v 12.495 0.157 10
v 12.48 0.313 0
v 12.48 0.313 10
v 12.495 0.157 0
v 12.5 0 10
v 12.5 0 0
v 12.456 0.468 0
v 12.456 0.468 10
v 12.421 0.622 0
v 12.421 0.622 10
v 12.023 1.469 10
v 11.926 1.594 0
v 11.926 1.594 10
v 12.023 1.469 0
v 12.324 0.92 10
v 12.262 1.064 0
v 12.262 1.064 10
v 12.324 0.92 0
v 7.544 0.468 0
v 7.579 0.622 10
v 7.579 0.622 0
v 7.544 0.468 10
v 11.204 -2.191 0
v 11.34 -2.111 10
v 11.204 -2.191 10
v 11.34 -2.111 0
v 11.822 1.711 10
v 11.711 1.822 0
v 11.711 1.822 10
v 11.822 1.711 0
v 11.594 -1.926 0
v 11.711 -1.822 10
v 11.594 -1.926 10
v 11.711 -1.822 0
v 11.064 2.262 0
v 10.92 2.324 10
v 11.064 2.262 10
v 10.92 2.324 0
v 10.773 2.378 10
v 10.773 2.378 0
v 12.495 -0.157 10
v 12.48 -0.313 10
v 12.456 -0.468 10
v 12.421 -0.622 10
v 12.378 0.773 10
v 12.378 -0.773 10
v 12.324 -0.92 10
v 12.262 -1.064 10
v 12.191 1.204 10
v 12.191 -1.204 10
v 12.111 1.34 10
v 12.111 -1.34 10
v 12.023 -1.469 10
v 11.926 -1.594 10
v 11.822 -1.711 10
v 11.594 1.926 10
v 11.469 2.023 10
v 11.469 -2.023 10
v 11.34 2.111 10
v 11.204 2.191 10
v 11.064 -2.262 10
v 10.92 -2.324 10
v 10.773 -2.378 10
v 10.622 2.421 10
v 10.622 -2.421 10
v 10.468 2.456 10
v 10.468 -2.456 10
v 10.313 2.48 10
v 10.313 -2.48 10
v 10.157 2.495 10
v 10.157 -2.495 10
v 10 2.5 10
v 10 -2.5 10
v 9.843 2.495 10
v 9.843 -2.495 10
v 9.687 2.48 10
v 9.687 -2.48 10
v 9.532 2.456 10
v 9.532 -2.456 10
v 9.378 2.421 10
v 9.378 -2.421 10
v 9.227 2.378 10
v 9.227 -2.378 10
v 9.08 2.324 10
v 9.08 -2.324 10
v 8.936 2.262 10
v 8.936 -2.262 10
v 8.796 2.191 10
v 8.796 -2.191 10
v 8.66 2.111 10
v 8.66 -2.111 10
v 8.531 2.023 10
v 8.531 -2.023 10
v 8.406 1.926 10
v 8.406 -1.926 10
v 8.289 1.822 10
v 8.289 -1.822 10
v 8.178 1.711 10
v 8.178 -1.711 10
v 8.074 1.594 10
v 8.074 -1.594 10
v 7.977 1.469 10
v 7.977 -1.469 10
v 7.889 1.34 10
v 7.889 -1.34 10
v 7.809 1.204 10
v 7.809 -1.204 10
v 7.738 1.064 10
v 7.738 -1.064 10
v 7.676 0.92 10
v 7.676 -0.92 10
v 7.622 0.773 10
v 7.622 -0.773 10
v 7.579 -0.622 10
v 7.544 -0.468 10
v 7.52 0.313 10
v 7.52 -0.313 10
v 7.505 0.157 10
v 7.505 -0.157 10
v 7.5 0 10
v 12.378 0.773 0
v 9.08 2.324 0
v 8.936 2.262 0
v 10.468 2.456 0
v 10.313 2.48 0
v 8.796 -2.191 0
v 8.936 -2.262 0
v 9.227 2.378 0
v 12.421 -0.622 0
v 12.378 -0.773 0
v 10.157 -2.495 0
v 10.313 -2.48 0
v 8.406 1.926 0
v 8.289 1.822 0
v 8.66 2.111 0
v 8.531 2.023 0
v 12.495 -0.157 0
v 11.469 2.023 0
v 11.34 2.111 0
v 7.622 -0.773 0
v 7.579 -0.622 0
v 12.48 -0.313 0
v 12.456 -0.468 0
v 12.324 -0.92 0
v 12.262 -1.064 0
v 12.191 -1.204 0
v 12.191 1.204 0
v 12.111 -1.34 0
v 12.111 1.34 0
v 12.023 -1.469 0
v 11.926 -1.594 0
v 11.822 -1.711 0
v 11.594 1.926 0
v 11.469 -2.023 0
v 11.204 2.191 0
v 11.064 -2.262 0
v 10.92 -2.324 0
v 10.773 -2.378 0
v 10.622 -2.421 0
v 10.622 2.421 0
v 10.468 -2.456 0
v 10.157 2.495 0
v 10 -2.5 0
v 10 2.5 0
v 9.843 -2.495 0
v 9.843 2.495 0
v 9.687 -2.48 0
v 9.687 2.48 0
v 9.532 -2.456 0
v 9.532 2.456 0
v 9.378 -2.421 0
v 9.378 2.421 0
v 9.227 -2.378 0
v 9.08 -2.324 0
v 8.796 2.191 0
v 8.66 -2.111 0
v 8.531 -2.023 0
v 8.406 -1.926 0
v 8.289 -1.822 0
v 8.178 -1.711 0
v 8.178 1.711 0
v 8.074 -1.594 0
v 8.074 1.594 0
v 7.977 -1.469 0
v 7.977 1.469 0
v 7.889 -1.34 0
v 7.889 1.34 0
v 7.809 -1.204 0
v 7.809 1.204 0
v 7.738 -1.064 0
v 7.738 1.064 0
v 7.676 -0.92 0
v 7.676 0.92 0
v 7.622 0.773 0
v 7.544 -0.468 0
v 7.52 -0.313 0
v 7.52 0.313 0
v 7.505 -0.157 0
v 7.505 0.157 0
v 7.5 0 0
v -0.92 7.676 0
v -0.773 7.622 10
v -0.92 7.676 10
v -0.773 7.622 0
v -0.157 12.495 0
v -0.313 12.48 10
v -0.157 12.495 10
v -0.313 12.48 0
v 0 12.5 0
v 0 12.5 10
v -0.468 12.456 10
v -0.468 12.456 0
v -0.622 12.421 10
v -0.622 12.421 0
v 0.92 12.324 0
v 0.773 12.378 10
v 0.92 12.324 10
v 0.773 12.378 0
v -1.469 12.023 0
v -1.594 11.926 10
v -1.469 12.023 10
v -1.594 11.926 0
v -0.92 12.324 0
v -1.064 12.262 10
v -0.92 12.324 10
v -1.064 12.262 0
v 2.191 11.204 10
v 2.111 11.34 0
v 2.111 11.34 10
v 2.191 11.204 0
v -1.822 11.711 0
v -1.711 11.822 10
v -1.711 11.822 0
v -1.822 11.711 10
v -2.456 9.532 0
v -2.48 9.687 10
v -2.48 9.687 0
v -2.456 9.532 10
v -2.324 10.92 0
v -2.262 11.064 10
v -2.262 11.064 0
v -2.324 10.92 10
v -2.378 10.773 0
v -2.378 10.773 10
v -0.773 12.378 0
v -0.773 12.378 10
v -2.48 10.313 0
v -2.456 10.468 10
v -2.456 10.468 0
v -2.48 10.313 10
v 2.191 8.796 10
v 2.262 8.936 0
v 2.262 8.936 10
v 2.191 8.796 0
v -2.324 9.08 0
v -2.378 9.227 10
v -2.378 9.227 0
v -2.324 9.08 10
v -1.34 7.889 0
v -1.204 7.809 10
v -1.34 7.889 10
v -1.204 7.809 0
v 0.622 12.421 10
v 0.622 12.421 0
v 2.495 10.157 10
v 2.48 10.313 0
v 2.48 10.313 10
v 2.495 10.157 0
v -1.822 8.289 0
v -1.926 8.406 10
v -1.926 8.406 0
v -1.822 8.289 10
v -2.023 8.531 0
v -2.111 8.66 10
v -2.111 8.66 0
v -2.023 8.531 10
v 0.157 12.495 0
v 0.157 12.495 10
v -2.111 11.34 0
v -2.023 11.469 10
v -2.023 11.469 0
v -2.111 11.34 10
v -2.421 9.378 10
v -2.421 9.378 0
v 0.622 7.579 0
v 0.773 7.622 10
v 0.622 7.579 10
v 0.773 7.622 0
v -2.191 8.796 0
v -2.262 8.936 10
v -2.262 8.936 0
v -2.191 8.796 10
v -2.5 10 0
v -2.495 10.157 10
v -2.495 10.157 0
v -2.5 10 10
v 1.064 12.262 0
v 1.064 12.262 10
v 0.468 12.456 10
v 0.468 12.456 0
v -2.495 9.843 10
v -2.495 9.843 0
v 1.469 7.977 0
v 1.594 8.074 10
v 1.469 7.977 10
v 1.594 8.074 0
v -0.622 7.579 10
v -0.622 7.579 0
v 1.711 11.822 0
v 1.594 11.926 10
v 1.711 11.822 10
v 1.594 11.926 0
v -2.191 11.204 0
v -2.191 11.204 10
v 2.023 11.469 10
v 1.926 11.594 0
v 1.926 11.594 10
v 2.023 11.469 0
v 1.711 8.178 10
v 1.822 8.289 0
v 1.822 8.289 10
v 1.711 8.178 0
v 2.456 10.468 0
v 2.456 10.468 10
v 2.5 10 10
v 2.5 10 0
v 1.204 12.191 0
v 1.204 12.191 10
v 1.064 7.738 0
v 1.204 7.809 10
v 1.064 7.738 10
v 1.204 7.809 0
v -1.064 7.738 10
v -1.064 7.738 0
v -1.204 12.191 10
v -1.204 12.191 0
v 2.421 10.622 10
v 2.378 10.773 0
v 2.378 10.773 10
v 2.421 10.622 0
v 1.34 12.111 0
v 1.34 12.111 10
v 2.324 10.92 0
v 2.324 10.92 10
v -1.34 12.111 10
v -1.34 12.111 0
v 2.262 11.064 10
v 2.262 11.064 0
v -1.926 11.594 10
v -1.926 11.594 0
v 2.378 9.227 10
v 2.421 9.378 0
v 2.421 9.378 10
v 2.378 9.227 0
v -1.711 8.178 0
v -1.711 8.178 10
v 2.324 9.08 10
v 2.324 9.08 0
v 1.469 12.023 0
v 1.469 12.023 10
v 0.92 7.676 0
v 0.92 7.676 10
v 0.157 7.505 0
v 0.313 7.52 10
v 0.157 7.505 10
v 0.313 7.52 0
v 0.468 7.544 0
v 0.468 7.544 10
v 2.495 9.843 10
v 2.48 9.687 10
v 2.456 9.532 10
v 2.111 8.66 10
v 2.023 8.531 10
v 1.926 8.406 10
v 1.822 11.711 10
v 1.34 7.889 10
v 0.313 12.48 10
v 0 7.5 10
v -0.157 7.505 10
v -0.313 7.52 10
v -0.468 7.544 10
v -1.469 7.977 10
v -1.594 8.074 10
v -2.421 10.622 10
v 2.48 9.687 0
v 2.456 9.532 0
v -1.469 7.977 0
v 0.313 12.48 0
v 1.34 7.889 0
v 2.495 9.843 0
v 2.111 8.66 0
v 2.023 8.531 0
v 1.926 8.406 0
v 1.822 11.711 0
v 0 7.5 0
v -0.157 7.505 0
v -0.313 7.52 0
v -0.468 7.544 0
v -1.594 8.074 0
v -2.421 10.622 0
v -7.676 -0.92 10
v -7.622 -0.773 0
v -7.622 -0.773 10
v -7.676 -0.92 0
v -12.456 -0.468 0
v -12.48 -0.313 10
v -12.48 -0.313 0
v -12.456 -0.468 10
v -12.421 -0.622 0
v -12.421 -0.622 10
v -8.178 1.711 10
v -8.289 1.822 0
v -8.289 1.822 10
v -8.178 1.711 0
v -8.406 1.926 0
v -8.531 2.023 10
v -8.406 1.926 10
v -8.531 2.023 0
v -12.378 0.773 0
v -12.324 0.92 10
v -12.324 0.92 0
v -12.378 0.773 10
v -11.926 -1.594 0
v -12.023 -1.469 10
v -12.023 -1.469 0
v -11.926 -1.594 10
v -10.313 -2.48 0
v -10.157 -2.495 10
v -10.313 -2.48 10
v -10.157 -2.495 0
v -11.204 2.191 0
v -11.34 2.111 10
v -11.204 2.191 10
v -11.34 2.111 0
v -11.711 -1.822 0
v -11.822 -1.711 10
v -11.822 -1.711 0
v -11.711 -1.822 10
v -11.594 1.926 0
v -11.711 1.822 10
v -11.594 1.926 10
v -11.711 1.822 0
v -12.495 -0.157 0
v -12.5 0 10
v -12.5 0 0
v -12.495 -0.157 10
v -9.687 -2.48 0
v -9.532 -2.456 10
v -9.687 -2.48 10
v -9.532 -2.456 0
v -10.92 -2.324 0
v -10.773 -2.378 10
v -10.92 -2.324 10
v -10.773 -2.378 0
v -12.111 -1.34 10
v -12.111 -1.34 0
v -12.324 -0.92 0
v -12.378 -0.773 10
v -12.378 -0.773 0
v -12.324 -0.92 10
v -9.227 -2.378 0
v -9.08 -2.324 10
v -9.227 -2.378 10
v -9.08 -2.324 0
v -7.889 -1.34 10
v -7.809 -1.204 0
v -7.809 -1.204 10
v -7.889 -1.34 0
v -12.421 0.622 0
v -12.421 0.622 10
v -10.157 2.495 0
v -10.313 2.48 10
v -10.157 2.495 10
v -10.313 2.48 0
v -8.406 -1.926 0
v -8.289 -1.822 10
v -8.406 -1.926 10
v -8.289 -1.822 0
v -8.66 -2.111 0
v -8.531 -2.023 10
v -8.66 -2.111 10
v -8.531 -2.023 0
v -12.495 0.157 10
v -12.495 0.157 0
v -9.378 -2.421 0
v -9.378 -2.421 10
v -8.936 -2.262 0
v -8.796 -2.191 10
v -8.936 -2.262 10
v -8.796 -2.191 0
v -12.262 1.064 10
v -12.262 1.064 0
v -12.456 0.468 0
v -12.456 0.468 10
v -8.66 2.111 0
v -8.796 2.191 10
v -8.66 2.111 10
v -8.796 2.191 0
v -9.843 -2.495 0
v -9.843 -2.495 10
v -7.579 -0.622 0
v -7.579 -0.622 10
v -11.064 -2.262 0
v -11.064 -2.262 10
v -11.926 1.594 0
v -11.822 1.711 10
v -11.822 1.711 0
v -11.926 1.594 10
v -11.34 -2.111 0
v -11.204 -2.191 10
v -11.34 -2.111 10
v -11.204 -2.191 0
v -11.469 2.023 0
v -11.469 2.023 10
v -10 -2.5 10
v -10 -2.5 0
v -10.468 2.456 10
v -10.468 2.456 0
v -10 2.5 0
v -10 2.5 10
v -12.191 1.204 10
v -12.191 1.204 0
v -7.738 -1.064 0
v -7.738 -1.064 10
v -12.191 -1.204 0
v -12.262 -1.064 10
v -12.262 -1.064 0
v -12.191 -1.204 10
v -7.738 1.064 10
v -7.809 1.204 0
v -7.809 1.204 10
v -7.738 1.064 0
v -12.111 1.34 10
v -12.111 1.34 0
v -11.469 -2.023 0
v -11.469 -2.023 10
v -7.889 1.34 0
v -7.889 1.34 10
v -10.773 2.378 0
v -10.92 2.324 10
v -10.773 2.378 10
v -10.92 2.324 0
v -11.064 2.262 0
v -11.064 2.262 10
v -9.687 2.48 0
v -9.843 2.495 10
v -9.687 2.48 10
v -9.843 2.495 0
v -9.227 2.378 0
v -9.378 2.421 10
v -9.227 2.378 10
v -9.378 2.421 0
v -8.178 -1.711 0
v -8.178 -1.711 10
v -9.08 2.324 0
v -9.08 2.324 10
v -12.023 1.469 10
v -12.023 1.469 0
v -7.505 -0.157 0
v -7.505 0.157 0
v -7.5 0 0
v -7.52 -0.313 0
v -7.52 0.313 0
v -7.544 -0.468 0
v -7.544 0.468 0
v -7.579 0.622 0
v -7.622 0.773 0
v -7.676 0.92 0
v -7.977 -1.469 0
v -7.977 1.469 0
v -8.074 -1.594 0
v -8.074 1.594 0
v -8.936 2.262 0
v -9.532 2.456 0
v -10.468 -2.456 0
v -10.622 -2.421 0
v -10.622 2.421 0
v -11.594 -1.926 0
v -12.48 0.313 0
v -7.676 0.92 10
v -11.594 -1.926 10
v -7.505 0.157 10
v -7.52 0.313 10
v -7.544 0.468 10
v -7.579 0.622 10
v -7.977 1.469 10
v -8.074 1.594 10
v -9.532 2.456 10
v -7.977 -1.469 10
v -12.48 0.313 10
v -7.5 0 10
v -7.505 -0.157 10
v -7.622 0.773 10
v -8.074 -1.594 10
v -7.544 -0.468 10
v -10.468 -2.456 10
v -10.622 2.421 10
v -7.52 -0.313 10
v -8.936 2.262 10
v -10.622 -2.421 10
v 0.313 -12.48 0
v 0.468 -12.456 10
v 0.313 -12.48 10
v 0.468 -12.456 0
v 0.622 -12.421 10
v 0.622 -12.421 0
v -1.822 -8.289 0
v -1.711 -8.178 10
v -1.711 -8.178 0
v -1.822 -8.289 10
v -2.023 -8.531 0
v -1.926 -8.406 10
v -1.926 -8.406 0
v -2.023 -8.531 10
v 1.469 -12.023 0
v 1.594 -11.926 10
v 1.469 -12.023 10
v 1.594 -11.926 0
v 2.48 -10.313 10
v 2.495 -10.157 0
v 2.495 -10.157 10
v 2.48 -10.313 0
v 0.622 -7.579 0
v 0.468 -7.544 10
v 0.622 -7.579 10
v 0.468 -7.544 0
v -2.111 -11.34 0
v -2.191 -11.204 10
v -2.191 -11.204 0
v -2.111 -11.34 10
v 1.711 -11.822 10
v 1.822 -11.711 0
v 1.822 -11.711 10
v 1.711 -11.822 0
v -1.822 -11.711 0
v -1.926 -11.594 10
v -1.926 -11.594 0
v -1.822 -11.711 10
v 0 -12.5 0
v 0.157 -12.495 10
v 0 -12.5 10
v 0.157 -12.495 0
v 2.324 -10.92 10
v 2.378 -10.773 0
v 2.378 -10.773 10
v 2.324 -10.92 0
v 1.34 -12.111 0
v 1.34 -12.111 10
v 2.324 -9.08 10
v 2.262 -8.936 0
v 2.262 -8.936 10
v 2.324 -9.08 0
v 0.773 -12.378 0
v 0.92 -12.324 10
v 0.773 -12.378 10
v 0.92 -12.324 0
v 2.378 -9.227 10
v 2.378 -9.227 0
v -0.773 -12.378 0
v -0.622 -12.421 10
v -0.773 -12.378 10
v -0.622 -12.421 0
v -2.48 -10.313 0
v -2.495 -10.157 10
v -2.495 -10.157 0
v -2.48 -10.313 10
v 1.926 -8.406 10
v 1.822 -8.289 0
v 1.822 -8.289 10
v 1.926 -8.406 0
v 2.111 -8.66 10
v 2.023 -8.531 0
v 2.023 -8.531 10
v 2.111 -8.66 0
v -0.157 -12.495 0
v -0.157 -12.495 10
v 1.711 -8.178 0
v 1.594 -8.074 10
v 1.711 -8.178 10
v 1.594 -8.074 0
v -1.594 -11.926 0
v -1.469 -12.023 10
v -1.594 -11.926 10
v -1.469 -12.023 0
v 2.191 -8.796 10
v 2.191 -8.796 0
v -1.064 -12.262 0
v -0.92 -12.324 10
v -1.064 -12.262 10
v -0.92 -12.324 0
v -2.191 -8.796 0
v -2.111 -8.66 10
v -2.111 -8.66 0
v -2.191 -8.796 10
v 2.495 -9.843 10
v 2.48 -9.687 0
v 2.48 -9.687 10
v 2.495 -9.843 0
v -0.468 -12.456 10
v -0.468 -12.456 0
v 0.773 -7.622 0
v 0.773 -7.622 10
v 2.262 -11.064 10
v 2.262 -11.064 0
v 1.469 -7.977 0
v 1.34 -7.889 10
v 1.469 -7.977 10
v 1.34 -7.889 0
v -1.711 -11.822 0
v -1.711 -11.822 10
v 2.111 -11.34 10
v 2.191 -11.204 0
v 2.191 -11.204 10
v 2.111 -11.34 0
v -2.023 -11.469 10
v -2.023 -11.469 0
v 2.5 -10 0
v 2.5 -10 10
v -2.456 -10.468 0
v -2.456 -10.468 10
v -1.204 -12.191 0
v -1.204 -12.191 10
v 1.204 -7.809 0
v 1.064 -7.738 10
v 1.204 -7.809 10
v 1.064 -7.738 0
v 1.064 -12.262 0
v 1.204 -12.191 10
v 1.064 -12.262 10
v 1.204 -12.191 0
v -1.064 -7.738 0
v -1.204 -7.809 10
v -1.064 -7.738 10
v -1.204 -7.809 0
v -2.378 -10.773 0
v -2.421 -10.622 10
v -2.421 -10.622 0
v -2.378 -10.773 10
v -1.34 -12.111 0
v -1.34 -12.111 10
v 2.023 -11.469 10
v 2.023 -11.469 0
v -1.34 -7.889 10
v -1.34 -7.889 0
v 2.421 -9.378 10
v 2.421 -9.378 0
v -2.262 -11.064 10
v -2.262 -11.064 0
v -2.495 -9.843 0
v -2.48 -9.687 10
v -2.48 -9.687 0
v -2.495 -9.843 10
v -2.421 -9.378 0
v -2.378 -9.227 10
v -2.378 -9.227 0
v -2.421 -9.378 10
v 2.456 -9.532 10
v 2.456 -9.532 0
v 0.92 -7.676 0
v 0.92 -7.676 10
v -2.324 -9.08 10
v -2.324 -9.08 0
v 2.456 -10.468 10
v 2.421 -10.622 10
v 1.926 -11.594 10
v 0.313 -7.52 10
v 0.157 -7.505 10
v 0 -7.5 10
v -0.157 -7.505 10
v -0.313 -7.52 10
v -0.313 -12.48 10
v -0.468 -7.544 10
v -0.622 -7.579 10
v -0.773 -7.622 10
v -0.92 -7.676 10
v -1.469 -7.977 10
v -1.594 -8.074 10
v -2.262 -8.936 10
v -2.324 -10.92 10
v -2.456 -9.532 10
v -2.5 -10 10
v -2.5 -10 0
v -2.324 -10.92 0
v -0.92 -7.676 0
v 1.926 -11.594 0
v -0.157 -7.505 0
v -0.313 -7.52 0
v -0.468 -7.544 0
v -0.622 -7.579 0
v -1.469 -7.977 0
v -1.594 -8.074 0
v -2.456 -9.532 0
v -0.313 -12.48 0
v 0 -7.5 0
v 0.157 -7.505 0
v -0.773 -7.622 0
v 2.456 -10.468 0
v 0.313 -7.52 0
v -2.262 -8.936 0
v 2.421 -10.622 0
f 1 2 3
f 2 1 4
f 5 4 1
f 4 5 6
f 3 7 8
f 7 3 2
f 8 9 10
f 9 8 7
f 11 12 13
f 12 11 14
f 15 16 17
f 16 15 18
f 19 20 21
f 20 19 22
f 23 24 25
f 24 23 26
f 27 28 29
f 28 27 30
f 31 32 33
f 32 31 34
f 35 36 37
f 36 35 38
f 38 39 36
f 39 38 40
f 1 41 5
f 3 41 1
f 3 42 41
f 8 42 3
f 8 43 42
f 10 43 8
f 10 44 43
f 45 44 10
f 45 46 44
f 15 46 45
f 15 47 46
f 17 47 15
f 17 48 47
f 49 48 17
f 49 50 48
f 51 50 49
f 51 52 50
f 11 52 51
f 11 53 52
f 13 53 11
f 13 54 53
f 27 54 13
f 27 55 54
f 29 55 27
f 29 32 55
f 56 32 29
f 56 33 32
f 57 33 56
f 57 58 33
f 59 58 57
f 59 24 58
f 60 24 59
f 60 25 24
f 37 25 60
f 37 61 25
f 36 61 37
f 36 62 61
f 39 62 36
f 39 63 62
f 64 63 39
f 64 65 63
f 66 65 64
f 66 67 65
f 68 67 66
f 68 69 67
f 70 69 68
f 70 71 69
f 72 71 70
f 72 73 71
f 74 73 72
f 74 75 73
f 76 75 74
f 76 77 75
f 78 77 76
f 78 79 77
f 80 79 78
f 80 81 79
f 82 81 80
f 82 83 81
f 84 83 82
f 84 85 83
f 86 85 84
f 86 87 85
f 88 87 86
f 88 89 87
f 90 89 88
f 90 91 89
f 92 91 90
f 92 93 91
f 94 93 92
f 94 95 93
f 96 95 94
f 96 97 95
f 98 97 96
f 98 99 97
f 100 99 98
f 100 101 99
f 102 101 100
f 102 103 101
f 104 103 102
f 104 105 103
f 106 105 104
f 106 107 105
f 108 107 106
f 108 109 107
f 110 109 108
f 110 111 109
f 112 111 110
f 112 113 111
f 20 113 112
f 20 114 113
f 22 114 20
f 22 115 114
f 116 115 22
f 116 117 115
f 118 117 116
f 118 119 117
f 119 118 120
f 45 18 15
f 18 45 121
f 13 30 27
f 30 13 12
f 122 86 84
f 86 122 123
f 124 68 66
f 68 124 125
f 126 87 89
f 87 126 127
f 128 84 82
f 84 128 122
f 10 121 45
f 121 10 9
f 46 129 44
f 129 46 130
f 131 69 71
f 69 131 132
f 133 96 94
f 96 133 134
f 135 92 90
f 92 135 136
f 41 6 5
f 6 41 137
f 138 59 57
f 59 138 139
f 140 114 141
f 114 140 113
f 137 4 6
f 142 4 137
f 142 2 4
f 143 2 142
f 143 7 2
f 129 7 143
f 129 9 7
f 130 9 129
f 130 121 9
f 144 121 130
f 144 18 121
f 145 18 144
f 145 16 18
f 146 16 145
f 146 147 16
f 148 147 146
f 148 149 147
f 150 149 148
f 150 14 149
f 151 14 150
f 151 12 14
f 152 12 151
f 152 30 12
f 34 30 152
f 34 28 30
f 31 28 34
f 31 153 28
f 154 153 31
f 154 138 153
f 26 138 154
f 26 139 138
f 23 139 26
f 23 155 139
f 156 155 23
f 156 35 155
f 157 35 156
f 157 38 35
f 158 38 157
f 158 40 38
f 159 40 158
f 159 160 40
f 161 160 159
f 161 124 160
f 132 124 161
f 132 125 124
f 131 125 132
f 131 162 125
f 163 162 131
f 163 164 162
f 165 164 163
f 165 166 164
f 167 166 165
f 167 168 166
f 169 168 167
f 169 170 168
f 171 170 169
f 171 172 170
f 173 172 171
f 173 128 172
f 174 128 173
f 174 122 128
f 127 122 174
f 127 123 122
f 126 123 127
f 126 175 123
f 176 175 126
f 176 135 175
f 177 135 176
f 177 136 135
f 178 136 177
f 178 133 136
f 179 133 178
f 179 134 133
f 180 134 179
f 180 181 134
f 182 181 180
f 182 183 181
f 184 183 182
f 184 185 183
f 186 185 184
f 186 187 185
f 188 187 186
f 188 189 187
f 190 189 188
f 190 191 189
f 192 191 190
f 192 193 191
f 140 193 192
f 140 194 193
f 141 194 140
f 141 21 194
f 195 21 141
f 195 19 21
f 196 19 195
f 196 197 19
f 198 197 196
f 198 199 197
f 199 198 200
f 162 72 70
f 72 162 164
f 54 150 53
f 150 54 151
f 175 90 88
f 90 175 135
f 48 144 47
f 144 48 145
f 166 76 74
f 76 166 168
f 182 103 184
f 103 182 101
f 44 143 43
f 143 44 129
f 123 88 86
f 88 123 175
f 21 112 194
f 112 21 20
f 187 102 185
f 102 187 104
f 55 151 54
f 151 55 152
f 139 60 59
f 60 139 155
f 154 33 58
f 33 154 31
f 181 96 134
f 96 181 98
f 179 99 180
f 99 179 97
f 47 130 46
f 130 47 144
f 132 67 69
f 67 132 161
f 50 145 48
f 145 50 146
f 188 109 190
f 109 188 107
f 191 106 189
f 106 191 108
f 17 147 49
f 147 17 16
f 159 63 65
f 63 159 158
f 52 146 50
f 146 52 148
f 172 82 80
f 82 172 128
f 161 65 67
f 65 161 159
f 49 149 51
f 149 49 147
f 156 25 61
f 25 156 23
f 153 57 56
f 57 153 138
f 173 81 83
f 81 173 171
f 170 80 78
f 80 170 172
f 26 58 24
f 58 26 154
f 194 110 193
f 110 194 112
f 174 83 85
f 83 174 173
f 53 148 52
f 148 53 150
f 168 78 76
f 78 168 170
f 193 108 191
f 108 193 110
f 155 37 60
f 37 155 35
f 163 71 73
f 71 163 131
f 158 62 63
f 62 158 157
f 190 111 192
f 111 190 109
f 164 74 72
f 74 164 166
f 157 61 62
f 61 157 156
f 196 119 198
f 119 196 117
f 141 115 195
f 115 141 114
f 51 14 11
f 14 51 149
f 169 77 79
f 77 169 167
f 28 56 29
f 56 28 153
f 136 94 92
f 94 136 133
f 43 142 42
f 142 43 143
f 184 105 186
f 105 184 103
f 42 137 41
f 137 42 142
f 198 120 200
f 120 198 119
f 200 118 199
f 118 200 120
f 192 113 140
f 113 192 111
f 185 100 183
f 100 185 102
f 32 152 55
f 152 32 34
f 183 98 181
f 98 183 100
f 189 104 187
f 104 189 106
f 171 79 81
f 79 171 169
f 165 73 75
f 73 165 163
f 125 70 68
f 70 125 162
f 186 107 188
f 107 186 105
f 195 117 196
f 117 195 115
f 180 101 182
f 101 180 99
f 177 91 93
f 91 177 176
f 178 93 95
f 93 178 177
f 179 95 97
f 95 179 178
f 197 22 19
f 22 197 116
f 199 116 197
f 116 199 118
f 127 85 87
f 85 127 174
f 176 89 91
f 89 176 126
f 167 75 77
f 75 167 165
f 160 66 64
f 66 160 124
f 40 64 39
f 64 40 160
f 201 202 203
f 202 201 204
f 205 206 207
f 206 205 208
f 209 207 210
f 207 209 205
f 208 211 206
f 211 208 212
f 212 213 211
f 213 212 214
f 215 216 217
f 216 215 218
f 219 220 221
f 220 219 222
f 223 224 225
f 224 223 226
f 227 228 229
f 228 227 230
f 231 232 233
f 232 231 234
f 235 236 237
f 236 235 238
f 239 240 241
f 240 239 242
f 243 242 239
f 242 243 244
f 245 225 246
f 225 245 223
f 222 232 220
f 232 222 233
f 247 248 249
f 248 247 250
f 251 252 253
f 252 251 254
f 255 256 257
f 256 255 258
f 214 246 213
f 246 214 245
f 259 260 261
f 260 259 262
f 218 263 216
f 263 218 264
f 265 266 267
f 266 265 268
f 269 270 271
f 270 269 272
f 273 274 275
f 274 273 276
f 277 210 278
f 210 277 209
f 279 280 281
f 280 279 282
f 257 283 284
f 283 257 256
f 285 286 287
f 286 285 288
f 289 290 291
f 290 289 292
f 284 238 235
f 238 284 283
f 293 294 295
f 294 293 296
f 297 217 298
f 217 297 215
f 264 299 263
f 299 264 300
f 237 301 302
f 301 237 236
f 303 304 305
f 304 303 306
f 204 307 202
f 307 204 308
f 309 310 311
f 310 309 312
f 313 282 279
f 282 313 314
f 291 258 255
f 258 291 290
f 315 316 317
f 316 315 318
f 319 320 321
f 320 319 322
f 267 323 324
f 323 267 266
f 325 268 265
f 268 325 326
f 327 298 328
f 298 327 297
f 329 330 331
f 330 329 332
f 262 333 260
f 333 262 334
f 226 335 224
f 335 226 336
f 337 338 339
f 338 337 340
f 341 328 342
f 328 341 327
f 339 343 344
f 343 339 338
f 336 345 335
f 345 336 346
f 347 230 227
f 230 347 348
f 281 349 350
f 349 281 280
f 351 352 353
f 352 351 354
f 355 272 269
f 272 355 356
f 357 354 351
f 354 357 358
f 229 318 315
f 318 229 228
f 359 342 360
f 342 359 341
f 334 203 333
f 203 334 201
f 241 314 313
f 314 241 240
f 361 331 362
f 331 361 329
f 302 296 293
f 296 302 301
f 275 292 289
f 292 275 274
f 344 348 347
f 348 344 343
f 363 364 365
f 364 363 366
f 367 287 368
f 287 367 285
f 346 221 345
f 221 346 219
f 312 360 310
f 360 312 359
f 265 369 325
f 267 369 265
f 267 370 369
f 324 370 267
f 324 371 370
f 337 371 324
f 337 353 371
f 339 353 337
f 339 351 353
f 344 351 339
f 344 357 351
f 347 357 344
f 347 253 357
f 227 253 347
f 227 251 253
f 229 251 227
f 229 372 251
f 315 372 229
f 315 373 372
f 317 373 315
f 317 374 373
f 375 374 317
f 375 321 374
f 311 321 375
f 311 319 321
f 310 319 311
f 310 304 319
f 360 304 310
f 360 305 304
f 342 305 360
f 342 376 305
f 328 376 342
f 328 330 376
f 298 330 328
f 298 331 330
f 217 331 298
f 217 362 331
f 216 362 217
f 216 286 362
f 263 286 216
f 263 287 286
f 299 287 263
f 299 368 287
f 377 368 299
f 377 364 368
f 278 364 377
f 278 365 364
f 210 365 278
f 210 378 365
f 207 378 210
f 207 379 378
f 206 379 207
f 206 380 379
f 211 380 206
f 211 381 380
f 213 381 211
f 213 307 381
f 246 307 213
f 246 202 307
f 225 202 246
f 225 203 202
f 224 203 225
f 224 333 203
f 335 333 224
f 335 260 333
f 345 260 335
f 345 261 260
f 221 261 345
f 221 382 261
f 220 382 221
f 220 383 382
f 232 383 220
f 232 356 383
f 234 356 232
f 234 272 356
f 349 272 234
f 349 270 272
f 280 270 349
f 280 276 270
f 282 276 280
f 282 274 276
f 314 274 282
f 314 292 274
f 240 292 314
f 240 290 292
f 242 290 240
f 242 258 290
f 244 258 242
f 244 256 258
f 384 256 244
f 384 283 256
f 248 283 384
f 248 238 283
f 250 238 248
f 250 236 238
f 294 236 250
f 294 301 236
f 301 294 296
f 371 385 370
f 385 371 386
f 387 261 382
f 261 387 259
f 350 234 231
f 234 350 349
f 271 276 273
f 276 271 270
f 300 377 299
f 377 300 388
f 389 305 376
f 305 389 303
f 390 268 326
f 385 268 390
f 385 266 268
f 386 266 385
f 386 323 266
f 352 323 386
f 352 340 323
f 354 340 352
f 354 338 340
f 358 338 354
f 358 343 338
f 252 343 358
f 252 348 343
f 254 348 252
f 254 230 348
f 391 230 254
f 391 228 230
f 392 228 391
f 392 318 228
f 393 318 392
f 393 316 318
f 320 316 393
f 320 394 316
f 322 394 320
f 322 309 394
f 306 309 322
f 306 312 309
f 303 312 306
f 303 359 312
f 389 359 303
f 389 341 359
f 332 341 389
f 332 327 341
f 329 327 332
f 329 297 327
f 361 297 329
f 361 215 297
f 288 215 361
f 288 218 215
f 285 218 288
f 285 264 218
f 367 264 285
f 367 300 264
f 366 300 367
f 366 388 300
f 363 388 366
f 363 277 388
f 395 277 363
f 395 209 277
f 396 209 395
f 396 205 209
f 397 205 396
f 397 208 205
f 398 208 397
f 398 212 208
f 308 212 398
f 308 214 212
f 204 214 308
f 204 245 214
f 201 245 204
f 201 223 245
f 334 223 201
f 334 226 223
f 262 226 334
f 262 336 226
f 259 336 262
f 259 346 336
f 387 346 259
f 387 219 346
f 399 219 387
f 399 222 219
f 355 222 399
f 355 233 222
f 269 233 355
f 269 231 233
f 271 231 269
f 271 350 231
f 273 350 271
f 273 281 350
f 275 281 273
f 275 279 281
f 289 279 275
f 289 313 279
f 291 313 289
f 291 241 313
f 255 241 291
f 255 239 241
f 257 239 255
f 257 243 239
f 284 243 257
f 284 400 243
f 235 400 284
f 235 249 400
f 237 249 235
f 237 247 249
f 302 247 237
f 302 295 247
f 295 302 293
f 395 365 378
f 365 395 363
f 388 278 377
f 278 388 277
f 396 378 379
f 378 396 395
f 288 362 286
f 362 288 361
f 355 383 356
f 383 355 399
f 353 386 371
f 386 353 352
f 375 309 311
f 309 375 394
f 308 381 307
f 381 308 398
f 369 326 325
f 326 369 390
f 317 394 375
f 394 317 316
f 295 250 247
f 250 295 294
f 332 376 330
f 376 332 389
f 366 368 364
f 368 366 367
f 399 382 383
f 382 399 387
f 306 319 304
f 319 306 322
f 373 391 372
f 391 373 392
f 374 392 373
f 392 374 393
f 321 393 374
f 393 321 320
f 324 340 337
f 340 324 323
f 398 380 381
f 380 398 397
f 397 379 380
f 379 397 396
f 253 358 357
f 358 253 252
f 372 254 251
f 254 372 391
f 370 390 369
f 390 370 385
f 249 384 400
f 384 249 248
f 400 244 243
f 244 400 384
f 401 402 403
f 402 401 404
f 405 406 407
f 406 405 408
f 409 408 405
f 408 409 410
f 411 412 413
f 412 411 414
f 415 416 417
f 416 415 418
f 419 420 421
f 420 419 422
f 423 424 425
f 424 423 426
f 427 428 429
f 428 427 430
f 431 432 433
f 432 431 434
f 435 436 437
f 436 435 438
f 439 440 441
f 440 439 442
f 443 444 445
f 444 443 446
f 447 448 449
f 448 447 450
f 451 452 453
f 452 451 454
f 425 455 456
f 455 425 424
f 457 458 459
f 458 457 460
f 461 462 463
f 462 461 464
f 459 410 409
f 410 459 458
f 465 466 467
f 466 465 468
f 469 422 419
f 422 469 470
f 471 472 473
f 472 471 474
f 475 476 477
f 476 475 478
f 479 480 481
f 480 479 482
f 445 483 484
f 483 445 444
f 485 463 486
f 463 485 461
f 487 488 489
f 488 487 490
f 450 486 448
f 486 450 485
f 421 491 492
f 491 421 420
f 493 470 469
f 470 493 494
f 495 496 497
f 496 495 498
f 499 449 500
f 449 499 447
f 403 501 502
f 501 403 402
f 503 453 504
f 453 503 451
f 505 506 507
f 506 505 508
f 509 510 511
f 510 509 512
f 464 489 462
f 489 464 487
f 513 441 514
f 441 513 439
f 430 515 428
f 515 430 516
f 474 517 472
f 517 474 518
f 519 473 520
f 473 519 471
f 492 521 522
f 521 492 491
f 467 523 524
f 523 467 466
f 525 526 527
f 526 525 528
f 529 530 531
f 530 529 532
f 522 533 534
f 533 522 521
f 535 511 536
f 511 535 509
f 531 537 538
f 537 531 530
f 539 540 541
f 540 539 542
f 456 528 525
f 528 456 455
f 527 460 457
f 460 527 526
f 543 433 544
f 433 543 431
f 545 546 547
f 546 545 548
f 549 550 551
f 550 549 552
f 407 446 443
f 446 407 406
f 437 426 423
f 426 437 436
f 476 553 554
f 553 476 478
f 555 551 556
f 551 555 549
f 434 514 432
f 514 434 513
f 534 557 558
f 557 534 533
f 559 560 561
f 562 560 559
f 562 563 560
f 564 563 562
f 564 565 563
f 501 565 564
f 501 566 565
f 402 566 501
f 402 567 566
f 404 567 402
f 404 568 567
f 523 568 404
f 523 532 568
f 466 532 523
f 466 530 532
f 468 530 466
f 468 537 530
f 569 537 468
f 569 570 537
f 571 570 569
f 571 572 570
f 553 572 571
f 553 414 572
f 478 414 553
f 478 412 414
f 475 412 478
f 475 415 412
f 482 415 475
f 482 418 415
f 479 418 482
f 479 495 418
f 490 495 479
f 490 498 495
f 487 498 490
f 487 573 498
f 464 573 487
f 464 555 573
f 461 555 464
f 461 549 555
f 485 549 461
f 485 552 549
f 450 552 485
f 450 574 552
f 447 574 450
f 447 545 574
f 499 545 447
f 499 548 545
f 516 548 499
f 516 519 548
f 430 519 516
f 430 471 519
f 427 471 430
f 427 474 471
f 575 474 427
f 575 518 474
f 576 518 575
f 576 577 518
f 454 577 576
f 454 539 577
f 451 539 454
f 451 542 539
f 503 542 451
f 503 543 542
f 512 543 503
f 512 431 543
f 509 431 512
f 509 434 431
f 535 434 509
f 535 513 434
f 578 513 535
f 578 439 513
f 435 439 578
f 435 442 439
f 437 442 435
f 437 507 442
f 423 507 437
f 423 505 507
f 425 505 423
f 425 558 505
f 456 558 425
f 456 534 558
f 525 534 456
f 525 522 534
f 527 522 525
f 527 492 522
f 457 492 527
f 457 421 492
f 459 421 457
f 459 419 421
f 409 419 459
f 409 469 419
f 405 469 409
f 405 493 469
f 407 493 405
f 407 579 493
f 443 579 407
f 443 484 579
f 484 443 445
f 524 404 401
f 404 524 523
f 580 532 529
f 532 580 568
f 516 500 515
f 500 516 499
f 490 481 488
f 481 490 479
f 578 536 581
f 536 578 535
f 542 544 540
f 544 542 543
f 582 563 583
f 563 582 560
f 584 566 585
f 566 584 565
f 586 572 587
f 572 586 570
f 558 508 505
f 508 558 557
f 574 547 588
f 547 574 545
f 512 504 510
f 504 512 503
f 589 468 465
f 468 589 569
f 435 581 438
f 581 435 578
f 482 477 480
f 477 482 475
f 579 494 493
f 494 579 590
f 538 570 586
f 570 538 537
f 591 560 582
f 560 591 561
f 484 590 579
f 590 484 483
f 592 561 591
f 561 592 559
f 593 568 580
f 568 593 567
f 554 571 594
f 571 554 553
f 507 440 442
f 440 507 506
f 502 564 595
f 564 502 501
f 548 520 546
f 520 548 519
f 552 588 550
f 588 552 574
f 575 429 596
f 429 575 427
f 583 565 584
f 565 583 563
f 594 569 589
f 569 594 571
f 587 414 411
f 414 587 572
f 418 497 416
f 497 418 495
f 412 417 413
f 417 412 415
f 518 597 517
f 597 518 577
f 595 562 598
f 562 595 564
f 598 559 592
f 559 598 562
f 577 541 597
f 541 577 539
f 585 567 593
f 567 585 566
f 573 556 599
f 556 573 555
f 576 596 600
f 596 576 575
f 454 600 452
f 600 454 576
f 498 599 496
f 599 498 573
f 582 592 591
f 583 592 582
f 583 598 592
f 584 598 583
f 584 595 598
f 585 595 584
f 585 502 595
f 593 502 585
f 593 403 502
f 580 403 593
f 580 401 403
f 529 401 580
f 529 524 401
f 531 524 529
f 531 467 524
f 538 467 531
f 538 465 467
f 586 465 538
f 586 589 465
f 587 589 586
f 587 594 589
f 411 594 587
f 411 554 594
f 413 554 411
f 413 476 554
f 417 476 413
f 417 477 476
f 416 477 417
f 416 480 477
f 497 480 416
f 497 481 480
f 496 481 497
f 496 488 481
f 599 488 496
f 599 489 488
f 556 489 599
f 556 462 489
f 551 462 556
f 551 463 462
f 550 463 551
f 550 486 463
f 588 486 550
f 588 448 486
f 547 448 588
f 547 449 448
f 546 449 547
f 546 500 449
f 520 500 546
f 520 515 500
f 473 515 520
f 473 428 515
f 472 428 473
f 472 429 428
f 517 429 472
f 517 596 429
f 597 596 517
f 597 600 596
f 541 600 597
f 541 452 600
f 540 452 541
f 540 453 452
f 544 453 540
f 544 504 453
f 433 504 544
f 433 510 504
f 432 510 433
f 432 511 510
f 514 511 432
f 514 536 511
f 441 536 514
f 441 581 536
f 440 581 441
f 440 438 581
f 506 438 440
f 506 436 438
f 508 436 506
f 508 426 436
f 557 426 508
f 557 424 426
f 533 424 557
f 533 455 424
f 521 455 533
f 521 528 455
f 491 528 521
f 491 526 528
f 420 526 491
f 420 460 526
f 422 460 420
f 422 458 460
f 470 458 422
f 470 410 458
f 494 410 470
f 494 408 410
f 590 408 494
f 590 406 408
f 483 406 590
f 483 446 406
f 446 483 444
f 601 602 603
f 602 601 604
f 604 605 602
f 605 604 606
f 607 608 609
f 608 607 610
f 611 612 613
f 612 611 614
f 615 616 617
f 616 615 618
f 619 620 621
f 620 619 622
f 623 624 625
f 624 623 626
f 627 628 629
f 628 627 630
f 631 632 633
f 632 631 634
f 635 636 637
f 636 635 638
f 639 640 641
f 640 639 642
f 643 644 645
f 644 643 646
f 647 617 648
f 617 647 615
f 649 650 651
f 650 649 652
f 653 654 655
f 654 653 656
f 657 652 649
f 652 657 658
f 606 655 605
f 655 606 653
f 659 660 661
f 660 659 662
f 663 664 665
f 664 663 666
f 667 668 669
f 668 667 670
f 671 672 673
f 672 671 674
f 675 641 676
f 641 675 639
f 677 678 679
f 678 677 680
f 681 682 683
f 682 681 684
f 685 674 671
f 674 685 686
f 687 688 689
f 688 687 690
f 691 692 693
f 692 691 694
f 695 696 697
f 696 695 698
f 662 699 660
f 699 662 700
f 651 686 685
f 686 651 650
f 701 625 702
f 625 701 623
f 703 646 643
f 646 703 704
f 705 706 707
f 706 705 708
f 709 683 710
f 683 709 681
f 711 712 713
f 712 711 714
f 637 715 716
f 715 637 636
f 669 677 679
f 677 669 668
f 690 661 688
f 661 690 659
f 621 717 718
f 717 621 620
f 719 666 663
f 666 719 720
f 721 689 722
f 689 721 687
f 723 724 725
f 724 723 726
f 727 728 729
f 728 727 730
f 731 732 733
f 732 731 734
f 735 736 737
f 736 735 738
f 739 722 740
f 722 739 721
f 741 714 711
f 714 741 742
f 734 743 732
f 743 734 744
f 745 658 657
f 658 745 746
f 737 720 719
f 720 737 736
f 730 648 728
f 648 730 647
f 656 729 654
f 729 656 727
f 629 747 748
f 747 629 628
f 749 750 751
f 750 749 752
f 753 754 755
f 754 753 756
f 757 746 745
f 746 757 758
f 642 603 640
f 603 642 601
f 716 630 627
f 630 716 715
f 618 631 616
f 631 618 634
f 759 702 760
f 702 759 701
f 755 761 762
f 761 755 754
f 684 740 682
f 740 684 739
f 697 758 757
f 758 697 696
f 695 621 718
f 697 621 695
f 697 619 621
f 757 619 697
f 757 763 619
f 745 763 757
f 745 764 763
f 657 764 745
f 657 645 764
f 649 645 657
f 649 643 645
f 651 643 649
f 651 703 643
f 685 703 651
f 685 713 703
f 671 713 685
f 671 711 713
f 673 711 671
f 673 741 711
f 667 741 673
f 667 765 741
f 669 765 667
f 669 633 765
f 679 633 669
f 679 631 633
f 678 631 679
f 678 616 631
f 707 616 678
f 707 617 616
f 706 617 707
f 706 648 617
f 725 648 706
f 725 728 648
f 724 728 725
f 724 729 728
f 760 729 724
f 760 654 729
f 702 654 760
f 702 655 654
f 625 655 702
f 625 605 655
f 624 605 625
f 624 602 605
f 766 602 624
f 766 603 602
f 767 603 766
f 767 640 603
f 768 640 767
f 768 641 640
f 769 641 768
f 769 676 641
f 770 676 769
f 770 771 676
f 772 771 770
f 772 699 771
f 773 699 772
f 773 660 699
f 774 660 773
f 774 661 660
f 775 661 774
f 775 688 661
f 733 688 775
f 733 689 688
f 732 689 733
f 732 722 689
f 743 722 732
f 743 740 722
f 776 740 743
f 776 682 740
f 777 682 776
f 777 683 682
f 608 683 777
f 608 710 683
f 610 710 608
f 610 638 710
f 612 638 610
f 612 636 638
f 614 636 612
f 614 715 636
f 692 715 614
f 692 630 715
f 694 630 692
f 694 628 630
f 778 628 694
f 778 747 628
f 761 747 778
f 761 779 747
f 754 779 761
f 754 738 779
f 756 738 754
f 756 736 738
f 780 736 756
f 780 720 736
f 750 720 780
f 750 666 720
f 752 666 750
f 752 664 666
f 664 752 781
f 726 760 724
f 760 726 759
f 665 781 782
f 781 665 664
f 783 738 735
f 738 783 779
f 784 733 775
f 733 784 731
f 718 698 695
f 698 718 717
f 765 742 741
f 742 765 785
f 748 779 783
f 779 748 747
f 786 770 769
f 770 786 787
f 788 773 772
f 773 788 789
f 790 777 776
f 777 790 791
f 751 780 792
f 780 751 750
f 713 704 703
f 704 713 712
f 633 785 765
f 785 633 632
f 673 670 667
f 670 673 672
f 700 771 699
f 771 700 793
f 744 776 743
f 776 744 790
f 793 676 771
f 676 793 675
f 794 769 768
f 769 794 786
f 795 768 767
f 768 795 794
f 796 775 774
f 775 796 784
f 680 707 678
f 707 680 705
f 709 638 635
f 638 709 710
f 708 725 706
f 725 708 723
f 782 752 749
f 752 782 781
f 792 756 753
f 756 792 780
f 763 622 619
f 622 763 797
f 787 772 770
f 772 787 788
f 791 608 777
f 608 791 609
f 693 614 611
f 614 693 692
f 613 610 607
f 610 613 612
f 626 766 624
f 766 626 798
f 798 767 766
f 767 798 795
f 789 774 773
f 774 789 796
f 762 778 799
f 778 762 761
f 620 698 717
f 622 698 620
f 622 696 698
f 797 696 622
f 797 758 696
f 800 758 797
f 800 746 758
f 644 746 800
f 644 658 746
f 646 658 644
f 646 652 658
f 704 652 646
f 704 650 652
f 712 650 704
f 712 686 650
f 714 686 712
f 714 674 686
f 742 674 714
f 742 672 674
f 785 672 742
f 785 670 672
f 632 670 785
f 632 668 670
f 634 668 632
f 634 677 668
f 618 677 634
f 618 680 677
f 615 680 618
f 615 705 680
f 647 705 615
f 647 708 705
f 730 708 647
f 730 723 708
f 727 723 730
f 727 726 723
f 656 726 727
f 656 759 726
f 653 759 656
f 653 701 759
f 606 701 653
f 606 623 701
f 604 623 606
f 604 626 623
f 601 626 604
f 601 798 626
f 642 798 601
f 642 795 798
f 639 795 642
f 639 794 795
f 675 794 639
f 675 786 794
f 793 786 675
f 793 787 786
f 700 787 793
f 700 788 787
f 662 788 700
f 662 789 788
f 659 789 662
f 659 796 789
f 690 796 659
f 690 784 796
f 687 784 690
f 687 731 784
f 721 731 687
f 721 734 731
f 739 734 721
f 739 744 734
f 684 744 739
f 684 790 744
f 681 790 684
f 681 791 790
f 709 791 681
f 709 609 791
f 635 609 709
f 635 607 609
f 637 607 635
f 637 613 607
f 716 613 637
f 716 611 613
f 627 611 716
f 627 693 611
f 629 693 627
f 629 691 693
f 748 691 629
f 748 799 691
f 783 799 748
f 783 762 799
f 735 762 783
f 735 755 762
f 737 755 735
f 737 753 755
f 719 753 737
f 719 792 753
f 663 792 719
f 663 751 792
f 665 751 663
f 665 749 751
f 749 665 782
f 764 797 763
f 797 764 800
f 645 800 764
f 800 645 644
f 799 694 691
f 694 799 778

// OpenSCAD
module holding_screws(
  screws=4,
  screw_diameter=5,
  screw_distance=10,
  screw_inset=10,
  screw_start_angle=0,
  washer_diameter=0,
  center=false,
  fn=100
)
{
  $fn = fn;
  // Holding screws
  for(screw=[0:screws-1]) {
    rotate([0, 0, screw_start_angle + 360/screws * screw]) {
      translate([screw_distance, 0, 0]) {
        cylinder(d=screw_diameter, h=screw_inset, center=center);
        %if(washer_diameter>0) {
            washer_height = 0.5;
            cylinder(d=washer_diameter, h=washer_height, center=center);
            translate([0, 0, screw_inset-washer_height])
              cylinder(d=washer_diameter, h=washer_height, center=center);
        }
      }
    }
  }
}

holding_screws();
